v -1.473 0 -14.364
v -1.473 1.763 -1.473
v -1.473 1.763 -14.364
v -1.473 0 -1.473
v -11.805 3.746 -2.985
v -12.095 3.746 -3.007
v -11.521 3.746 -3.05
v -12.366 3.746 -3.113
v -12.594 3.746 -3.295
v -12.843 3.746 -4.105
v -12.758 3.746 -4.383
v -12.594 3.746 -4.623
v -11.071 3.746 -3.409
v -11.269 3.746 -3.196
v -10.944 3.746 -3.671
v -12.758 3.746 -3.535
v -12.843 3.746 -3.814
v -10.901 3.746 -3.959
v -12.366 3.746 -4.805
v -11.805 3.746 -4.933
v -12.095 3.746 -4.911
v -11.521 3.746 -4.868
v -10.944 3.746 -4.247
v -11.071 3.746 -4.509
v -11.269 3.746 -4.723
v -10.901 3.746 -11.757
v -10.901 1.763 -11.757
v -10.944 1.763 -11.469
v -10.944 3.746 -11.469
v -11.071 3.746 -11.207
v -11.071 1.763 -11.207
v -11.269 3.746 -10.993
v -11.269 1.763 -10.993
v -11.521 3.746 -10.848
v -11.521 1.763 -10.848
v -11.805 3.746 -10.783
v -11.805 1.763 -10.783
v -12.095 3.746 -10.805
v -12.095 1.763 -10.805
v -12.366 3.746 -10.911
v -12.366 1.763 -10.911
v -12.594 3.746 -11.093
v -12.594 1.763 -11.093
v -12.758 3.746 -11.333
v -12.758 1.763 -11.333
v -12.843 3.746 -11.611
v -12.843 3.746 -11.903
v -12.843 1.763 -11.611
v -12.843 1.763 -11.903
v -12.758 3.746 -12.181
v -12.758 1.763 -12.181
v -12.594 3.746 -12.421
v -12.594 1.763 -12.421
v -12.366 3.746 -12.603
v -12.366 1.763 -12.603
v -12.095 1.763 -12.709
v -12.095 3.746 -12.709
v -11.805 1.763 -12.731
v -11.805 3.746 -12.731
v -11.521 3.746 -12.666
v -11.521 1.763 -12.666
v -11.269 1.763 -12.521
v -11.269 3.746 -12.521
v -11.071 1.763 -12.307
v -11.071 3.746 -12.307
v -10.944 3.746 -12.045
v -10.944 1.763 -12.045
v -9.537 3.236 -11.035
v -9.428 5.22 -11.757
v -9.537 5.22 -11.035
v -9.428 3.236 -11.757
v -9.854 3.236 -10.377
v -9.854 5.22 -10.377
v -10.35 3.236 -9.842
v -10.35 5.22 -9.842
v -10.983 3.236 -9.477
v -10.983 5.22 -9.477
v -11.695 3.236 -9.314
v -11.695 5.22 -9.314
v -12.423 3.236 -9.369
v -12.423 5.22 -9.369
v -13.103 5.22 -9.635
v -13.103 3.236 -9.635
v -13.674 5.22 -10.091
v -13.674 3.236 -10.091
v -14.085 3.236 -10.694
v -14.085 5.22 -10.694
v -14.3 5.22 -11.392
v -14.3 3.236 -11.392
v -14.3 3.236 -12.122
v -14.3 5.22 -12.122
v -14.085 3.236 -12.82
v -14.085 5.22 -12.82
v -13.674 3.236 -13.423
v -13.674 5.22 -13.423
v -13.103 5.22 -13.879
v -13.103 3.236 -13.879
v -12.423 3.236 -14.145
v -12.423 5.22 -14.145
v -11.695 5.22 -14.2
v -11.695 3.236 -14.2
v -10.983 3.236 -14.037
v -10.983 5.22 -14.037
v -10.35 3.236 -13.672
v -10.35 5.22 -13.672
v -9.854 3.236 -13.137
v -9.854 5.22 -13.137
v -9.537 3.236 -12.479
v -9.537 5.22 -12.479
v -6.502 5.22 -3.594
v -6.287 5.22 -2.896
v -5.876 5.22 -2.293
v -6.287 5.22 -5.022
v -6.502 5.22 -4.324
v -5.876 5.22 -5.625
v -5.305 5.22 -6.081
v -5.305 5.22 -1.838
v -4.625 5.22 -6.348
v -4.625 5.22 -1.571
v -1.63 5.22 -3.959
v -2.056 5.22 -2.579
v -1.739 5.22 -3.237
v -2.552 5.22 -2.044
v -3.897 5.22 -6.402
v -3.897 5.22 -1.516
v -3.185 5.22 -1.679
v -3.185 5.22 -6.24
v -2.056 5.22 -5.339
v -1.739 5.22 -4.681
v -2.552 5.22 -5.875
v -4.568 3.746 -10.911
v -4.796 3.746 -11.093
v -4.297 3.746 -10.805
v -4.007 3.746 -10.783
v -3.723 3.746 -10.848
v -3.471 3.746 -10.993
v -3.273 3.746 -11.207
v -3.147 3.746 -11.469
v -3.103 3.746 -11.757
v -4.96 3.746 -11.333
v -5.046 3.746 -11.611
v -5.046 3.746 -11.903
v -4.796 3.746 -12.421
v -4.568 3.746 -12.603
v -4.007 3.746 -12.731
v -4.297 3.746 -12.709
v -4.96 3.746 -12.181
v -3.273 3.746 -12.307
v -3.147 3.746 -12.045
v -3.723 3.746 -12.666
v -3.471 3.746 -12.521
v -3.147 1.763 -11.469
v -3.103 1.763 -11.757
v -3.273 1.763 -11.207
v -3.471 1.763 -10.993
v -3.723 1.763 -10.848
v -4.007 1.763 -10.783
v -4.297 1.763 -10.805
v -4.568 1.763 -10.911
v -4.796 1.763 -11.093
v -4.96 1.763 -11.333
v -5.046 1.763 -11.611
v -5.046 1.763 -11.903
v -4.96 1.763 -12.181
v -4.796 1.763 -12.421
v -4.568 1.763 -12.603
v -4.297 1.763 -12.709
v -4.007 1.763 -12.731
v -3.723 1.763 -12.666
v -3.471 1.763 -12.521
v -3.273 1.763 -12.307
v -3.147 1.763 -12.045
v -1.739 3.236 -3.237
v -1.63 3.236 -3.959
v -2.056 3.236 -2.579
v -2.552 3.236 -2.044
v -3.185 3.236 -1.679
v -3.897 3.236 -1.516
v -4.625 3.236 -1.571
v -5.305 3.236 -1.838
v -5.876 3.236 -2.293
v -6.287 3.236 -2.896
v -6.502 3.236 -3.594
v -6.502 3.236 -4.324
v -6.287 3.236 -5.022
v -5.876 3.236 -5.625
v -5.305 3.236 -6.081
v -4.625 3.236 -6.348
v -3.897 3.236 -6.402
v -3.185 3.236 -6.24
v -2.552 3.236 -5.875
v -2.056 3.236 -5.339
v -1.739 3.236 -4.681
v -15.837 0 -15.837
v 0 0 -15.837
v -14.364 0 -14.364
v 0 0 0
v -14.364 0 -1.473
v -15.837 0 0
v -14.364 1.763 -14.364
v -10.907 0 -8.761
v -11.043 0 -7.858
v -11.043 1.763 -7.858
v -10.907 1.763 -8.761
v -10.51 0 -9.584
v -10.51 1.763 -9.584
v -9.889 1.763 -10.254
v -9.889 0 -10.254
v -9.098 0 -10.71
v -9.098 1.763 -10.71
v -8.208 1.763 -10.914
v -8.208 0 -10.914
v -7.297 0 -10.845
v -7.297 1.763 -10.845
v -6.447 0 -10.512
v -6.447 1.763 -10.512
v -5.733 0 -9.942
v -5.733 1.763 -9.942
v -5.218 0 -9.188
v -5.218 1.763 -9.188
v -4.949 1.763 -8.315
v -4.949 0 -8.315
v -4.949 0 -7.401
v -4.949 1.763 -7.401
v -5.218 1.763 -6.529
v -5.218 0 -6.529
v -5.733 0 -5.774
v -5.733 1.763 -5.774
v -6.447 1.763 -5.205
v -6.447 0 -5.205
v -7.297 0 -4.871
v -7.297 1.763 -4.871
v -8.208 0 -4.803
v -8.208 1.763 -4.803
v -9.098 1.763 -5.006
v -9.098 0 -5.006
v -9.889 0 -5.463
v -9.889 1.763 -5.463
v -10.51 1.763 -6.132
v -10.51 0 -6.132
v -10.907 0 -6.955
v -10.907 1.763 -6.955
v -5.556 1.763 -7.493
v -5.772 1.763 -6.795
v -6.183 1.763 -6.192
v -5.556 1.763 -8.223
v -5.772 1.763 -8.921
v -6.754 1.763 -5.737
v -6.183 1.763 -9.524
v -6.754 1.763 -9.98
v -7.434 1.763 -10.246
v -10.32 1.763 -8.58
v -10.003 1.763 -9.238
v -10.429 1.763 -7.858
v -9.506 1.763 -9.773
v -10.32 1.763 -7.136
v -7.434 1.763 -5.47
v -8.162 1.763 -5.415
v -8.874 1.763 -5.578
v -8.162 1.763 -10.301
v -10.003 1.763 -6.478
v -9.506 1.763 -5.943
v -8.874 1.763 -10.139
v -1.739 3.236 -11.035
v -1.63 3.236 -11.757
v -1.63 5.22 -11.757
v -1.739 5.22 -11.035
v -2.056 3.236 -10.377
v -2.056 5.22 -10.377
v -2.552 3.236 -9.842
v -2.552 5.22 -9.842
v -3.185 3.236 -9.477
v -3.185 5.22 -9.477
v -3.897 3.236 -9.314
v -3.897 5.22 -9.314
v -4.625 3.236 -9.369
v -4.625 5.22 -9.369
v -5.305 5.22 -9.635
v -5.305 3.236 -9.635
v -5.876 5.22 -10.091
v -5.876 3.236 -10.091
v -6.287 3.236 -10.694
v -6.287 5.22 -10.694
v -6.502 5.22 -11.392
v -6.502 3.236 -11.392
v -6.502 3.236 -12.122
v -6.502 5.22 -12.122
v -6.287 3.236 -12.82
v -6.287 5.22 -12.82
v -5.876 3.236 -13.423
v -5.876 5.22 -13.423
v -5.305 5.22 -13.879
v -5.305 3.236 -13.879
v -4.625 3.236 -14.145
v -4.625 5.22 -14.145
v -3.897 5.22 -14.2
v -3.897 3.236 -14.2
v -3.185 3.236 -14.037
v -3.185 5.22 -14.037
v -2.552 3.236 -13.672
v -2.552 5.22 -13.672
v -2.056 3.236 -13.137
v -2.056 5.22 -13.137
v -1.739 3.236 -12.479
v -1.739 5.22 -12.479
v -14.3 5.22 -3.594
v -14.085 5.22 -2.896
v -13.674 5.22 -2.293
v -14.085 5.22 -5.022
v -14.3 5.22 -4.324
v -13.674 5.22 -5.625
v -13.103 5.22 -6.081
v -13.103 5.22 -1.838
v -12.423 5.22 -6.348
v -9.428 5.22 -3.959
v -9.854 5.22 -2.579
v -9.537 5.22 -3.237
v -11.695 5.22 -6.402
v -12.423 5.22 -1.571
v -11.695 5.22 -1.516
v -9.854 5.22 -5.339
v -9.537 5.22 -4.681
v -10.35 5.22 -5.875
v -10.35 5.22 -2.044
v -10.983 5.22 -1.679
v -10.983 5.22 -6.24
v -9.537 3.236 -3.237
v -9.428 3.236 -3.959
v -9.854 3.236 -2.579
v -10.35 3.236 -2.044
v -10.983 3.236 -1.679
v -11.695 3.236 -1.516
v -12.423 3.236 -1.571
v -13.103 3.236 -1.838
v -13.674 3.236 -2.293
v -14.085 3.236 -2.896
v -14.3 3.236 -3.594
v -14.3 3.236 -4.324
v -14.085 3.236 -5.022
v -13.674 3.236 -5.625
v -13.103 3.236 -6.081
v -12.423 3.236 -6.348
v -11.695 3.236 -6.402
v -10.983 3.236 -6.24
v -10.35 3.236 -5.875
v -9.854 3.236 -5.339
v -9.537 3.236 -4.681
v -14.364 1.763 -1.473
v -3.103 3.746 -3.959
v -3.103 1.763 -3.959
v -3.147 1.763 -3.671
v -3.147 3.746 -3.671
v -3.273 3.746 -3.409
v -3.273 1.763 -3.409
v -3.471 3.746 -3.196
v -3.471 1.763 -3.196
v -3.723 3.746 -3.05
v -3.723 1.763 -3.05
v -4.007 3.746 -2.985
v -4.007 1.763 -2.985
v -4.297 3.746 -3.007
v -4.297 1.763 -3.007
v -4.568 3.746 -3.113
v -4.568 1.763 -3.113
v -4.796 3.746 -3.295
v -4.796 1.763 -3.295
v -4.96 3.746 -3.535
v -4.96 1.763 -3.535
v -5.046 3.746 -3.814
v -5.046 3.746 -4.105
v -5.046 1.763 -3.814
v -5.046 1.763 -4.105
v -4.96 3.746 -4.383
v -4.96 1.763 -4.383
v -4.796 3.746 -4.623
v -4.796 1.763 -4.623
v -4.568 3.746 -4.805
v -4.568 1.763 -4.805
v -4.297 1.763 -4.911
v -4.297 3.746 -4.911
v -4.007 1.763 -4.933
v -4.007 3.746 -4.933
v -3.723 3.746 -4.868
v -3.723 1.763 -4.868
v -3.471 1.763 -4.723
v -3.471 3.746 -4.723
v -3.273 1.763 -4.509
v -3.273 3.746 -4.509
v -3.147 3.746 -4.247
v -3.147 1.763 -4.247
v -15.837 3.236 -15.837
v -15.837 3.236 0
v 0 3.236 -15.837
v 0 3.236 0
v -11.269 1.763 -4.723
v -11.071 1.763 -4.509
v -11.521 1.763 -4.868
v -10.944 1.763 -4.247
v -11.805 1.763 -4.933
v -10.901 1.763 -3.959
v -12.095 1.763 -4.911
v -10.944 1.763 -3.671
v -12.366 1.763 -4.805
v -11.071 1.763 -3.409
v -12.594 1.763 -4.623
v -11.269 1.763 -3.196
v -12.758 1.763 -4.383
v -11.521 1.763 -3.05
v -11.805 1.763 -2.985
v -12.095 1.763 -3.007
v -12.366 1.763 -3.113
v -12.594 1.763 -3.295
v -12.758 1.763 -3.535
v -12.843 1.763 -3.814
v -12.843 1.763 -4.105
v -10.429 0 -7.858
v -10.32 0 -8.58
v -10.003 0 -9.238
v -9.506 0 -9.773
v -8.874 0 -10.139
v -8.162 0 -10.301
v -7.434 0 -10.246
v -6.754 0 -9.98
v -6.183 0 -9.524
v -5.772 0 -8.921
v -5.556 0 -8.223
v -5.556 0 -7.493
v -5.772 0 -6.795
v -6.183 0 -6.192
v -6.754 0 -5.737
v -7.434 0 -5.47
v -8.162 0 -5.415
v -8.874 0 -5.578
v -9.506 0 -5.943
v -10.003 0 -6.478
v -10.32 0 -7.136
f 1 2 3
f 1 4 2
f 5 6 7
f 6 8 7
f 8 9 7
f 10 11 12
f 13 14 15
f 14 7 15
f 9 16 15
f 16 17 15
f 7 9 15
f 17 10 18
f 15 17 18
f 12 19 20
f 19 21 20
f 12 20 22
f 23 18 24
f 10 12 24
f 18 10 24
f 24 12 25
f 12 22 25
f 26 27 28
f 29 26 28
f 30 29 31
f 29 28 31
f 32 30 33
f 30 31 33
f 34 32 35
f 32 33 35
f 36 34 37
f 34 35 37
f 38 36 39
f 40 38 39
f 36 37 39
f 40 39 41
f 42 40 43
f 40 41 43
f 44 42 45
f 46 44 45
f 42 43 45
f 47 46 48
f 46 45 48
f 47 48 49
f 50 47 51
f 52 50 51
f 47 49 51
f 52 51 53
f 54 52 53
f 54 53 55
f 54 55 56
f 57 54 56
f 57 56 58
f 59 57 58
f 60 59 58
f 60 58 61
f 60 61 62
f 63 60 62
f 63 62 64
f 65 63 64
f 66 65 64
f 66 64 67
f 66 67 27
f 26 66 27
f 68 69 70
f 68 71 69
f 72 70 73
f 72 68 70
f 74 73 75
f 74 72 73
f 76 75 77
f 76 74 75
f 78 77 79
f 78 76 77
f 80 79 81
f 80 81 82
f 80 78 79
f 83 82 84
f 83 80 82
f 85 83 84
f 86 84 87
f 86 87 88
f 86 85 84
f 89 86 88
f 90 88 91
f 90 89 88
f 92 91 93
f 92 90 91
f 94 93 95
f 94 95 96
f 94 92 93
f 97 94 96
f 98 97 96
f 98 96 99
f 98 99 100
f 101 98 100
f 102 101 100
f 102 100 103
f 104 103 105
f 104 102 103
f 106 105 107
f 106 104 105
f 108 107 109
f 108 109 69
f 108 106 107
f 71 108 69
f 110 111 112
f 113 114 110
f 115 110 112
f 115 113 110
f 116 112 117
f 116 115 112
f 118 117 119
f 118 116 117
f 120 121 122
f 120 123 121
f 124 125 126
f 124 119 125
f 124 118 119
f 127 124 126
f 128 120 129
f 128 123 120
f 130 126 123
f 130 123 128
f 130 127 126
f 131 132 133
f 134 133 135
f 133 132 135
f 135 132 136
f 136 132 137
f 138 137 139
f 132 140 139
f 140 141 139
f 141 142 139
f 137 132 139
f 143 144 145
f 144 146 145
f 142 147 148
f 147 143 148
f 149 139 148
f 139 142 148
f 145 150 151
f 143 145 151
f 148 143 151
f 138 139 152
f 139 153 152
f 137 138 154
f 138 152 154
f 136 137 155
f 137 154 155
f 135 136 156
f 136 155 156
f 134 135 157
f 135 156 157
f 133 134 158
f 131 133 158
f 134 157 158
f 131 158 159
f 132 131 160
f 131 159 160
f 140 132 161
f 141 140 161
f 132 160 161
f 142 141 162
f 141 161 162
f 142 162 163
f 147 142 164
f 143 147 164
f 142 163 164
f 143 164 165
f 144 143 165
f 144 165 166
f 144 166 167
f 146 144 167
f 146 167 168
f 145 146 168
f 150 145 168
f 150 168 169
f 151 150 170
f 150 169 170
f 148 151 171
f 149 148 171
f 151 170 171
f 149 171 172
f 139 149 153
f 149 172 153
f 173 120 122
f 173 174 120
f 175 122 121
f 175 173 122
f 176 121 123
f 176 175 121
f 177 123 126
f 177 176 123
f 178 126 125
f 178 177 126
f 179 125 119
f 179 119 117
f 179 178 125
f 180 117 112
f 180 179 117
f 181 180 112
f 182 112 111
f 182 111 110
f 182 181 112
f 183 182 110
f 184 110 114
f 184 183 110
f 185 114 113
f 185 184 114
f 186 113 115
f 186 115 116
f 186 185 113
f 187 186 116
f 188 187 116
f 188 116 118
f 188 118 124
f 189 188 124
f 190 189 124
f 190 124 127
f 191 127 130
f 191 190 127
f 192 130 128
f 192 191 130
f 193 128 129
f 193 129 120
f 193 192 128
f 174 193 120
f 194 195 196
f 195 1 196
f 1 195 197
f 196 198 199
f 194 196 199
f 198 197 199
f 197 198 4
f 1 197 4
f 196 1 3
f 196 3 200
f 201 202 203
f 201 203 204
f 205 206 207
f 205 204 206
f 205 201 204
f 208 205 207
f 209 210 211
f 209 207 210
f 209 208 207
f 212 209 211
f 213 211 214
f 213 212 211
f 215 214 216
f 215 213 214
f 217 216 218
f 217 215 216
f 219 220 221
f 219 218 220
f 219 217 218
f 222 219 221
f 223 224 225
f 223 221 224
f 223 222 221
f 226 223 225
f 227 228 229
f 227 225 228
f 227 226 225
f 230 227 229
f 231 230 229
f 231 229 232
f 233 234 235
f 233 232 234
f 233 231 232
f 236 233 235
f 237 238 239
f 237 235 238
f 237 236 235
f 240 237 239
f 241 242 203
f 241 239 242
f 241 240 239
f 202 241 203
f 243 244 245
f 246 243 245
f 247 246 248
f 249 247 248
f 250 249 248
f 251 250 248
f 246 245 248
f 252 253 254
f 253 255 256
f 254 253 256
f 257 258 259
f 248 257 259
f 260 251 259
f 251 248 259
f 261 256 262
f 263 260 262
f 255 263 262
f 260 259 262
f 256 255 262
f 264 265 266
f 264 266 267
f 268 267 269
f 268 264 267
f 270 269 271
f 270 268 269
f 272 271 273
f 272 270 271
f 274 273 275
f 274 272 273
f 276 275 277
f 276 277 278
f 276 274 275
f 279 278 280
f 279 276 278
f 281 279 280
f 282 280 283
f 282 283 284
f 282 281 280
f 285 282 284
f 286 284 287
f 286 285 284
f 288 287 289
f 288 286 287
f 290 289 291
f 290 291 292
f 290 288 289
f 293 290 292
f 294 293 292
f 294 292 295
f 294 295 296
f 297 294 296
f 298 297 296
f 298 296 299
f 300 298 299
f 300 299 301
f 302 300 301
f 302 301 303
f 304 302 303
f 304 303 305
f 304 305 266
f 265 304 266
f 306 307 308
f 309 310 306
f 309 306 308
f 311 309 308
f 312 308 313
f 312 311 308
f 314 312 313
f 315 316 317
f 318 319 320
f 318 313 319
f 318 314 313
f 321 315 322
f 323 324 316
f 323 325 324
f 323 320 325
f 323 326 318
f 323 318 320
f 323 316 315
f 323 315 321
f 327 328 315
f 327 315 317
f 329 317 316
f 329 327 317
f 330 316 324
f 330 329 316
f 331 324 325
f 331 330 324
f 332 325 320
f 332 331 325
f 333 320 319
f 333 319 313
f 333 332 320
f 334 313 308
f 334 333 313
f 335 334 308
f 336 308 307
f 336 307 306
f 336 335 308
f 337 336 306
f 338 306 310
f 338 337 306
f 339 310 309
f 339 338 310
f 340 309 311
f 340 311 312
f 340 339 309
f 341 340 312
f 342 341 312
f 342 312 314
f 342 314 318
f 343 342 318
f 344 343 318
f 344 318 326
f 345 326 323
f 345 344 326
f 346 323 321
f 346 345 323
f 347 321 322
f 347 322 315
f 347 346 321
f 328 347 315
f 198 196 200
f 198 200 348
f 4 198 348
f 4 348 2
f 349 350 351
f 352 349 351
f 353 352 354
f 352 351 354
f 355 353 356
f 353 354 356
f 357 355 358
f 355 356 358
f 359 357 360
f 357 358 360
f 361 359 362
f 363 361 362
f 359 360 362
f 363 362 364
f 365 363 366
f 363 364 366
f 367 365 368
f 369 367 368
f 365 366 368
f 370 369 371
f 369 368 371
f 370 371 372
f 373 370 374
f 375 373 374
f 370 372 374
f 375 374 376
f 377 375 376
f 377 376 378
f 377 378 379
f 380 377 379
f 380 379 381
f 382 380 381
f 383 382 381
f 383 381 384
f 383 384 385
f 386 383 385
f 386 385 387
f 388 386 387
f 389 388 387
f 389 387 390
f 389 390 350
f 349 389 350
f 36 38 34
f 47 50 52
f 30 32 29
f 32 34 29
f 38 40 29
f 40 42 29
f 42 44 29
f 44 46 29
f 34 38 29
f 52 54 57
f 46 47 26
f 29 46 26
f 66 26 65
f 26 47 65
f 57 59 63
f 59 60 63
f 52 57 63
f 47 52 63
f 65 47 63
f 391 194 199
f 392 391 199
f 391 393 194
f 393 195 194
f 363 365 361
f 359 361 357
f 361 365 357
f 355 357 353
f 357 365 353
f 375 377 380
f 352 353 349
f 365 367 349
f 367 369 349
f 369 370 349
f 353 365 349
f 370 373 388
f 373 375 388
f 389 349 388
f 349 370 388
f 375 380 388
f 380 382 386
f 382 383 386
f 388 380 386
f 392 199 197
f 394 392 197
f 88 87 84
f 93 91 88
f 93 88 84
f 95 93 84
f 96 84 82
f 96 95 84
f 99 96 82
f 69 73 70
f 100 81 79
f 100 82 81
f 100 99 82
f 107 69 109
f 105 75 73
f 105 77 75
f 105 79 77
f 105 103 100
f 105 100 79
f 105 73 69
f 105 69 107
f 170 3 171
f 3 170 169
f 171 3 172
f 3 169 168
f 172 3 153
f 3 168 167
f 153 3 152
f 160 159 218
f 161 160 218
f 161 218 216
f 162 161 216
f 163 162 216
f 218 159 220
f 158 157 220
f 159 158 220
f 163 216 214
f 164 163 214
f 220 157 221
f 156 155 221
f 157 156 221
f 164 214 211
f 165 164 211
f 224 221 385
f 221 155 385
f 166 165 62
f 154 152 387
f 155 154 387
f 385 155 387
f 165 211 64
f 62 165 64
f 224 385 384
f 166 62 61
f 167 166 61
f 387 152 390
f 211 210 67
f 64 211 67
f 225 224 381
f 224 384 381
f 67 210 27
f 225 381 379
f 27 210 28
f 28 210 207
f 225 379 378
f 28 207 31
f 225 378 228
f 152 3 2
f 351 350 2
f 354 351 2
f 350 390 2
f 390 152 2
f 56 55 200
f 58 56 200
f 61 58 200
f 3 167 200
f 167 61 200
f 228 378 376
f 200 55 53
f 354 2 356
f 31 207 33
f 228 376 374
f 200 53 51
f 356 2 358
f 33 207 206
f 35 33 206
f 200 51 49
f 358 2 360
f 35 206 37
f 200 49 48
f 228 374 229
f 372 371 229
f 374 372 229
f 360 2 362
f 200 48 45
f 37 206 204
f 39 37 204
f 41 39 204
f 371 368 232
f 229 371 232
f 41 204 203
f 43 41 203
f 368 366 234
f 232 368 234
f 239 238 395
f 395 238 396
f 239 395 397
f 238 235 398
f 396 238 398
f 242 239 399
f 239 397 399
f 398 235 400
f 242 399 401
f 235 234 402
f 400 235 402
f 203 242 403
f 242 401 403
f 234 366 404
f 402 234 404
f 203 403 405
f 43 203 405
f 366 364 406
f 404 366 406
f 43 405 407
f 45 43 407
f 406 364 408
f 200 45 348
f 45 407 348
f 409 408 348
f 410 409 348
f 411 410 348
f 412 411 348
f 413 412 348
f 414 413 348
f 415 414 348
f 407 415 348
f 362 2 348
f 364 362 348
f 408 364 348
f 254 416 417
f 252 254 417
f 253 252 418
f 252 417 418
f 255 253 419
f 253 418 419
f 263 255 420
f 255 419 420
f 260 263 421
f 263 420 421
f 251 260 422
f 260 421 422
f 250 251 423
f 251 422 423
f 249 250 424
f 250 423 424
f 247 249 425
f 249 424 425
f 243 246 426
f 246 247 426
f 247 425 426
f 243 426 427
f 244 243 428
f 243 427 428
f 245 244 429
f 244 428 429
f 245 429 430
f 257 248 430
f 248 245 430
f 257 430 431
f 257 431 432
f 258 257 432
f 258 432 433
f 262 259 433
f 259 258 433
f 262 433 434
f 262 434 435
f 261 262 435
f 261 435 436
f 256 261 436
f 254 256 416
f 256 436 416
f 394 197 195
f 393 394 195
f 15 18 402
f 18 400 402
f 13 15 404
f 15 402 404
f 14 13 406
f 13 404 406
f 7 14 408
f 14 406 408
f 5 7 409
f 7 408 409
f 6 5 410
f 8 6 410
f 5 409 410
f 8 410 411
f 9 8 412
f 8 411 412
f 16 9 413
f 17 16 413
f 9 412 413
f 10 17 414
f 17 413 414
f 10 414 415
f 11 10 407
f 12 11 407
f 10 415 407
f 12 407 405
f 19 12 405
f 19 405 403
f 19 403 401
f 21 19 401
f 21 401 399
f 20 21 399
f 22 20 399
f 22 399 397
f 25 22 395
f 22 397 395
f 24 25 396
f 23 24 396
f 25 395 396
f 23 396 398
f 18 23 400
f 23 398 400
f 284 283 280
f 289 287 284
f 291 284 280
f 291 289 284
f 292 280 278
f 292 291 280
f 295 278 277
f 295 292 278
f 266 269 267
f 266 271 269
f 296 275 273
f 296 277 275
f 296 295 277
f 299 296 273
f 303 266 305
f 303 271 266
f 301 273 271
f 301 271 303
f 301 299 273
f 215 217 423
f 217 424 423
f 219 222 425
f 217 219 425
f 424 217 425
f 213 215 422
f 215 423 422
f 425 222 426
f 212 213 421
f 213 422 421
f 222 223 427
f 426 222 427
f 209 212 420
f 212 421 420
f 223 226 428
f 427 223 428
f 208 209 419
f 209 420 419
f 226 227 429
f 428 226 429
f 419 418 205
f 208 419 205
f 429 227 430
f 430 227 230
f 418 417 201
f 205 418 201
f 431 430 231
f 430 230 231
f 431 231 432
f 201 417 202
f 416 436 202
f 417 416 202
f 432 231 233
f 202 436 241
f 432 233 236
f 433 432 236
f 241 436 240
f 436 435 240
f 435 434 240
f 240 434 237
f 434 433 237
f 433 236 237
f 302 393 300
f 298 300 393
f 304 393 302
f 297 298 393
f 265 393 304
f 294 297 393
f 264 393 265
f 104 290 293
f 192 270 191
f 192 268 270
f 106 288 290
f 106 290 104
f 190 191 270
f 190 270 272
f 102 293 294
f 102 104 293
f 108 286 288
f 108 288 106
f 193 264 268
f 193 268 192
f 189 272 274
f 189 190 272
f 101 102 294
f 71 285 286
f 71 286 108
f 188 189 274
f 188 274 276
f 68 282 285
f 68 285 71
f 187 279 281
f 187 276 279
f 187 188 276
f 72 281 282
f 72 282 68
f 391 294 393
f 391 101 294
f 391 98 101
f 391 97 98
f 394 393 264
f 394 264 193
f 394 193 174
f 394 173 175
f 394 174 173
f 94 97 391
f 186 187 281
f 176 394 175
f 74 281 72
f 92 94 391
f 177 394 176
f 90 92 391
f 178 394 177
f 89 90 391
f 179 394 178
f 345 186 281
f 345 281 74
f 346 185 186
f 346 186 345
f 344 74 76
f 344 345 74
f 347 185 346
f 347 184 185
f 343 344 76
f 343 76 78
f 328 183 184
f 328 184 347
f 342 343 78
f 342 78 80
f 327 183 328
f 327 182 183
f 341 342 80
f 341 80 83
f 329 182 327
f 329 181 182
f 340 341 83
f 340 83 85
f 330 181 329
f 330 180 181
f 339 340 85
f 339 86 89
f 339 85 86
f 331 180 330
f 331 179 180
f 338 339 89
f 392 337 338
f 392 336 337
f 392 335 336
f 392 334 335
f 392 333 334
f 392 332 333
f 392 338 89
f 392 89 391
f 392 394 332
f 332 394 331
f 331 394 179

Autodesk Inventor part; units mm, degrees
ref_plane "YZ Plane" through (0, 0, 0) normal (1, 0, 0) x (0, 1, 0)
ref_plane "XZ Plane" through (0, 0, 0) normal (0, 1, 0) x (-1, 0, 0)
ref_plane "XY Plane" through (0, 0, 0) normal (0, 0, 1) x (1, 0, 0)
sketch "Sketch1" plane through (0, 0, 0) normal (0, 1, 0) x (-1, 0, 0)
  line L0 (0, 0) -> (0, -15.8369)
  line L1 (0, -15.8369) -> (15.8369, -15.8369)
  line L2 (15.8369, -15.8369) -> (15.8369, 0)
  line L3 (15.8369, 0) -> (0, 0)
  dimension "d0" = 15.8369
  dimension "d1" = 15.8369
  dimension "d2" = 15.8369
extrude "Extrusion1" add sketch "Sketch1" along normal blind 3.236
sketch "Sketch2" plane through (0, 3.236, 0) normal (0, 1, 0) x (1, 0, 0)
  line L0 (-15.8369, 15.8369) -> (-15.8369, 0) projected
  line L1 (-15.8369, 0) -> (0, 15.8369)
  line L2 (0, 15.8369) -> (-15.8369, 15.8369)
  line L3 (-15.8369, 15.8369) -> (0, 0)
  line L4 (-7.9185, 7.9185) -> (0, 7.9185)
  line L5 (0, 7.9185) -> (-15.8369, 7.9185)
  line L6 (-7.9185, 7.9185) -> (-7.9185, 15.8369)
  line L7 (0, 15.8369) -> (-15.8369, 15.8369) projected
  line L8 (-7.9185, 0) -> (-7.9185, 7.9185)
  line L9 (-7.9185, 0) -> (-15.8369, 7.9185)
  line L10 (-15.8369, 7.9185) -> (-7.9185, 15.8369)
  line L11 (0, 7.9185) -> (-7.9185, 15.8369)
  line L12 (-7.9185, 0) -> (0, 7.9185)
  circle A0 centre (-11.8777, 3.9592) radius 2.4498
  dimension "d5" = 4.8997
extrude "Extrusion2" add sketch "Sketch2" along normal blind 1.9837 contours A0 L1 L9 | L9 L1 A0 | L1 L9 A0 | A0 L9 L1
pattern_linear "Rectangular Pattern1" count 2 spacing 7.7978 along (1, 0, 0) count 2 spacing 7.7978 along (0, 0, -1) of "Extrusion2"
shell "Shell1" thickness 1.4732 removed faces 1 at (-5.279, 0, -10.5579)
sketch "Sketch3" plane through (0, 0, 0) normal (0, 1, 0) x (-1, 0, 0)
  circle A0 centre (4.0799, -3.9592) radius 2.4498 construction
  circle A1 centre (11.8777, -11.757) radius 2.4498 construction
  line L0 (4.0799, -3.9592) -> (11.8777, -11.757) construction
  circle A2 centre (7.9788, -7.8581) radius 3.064
  circle A3 centre (7.9788, -7.8581) radius 2.4498
  point P0 (0, 0)
  dimension "d15" = 4.8997
extrude "Extrusion3" add sketch "Sketch3" along normal up to surface (1.7628 mm away)
properties part number "2x2 short orange pegged" material "ABS Plastic"
